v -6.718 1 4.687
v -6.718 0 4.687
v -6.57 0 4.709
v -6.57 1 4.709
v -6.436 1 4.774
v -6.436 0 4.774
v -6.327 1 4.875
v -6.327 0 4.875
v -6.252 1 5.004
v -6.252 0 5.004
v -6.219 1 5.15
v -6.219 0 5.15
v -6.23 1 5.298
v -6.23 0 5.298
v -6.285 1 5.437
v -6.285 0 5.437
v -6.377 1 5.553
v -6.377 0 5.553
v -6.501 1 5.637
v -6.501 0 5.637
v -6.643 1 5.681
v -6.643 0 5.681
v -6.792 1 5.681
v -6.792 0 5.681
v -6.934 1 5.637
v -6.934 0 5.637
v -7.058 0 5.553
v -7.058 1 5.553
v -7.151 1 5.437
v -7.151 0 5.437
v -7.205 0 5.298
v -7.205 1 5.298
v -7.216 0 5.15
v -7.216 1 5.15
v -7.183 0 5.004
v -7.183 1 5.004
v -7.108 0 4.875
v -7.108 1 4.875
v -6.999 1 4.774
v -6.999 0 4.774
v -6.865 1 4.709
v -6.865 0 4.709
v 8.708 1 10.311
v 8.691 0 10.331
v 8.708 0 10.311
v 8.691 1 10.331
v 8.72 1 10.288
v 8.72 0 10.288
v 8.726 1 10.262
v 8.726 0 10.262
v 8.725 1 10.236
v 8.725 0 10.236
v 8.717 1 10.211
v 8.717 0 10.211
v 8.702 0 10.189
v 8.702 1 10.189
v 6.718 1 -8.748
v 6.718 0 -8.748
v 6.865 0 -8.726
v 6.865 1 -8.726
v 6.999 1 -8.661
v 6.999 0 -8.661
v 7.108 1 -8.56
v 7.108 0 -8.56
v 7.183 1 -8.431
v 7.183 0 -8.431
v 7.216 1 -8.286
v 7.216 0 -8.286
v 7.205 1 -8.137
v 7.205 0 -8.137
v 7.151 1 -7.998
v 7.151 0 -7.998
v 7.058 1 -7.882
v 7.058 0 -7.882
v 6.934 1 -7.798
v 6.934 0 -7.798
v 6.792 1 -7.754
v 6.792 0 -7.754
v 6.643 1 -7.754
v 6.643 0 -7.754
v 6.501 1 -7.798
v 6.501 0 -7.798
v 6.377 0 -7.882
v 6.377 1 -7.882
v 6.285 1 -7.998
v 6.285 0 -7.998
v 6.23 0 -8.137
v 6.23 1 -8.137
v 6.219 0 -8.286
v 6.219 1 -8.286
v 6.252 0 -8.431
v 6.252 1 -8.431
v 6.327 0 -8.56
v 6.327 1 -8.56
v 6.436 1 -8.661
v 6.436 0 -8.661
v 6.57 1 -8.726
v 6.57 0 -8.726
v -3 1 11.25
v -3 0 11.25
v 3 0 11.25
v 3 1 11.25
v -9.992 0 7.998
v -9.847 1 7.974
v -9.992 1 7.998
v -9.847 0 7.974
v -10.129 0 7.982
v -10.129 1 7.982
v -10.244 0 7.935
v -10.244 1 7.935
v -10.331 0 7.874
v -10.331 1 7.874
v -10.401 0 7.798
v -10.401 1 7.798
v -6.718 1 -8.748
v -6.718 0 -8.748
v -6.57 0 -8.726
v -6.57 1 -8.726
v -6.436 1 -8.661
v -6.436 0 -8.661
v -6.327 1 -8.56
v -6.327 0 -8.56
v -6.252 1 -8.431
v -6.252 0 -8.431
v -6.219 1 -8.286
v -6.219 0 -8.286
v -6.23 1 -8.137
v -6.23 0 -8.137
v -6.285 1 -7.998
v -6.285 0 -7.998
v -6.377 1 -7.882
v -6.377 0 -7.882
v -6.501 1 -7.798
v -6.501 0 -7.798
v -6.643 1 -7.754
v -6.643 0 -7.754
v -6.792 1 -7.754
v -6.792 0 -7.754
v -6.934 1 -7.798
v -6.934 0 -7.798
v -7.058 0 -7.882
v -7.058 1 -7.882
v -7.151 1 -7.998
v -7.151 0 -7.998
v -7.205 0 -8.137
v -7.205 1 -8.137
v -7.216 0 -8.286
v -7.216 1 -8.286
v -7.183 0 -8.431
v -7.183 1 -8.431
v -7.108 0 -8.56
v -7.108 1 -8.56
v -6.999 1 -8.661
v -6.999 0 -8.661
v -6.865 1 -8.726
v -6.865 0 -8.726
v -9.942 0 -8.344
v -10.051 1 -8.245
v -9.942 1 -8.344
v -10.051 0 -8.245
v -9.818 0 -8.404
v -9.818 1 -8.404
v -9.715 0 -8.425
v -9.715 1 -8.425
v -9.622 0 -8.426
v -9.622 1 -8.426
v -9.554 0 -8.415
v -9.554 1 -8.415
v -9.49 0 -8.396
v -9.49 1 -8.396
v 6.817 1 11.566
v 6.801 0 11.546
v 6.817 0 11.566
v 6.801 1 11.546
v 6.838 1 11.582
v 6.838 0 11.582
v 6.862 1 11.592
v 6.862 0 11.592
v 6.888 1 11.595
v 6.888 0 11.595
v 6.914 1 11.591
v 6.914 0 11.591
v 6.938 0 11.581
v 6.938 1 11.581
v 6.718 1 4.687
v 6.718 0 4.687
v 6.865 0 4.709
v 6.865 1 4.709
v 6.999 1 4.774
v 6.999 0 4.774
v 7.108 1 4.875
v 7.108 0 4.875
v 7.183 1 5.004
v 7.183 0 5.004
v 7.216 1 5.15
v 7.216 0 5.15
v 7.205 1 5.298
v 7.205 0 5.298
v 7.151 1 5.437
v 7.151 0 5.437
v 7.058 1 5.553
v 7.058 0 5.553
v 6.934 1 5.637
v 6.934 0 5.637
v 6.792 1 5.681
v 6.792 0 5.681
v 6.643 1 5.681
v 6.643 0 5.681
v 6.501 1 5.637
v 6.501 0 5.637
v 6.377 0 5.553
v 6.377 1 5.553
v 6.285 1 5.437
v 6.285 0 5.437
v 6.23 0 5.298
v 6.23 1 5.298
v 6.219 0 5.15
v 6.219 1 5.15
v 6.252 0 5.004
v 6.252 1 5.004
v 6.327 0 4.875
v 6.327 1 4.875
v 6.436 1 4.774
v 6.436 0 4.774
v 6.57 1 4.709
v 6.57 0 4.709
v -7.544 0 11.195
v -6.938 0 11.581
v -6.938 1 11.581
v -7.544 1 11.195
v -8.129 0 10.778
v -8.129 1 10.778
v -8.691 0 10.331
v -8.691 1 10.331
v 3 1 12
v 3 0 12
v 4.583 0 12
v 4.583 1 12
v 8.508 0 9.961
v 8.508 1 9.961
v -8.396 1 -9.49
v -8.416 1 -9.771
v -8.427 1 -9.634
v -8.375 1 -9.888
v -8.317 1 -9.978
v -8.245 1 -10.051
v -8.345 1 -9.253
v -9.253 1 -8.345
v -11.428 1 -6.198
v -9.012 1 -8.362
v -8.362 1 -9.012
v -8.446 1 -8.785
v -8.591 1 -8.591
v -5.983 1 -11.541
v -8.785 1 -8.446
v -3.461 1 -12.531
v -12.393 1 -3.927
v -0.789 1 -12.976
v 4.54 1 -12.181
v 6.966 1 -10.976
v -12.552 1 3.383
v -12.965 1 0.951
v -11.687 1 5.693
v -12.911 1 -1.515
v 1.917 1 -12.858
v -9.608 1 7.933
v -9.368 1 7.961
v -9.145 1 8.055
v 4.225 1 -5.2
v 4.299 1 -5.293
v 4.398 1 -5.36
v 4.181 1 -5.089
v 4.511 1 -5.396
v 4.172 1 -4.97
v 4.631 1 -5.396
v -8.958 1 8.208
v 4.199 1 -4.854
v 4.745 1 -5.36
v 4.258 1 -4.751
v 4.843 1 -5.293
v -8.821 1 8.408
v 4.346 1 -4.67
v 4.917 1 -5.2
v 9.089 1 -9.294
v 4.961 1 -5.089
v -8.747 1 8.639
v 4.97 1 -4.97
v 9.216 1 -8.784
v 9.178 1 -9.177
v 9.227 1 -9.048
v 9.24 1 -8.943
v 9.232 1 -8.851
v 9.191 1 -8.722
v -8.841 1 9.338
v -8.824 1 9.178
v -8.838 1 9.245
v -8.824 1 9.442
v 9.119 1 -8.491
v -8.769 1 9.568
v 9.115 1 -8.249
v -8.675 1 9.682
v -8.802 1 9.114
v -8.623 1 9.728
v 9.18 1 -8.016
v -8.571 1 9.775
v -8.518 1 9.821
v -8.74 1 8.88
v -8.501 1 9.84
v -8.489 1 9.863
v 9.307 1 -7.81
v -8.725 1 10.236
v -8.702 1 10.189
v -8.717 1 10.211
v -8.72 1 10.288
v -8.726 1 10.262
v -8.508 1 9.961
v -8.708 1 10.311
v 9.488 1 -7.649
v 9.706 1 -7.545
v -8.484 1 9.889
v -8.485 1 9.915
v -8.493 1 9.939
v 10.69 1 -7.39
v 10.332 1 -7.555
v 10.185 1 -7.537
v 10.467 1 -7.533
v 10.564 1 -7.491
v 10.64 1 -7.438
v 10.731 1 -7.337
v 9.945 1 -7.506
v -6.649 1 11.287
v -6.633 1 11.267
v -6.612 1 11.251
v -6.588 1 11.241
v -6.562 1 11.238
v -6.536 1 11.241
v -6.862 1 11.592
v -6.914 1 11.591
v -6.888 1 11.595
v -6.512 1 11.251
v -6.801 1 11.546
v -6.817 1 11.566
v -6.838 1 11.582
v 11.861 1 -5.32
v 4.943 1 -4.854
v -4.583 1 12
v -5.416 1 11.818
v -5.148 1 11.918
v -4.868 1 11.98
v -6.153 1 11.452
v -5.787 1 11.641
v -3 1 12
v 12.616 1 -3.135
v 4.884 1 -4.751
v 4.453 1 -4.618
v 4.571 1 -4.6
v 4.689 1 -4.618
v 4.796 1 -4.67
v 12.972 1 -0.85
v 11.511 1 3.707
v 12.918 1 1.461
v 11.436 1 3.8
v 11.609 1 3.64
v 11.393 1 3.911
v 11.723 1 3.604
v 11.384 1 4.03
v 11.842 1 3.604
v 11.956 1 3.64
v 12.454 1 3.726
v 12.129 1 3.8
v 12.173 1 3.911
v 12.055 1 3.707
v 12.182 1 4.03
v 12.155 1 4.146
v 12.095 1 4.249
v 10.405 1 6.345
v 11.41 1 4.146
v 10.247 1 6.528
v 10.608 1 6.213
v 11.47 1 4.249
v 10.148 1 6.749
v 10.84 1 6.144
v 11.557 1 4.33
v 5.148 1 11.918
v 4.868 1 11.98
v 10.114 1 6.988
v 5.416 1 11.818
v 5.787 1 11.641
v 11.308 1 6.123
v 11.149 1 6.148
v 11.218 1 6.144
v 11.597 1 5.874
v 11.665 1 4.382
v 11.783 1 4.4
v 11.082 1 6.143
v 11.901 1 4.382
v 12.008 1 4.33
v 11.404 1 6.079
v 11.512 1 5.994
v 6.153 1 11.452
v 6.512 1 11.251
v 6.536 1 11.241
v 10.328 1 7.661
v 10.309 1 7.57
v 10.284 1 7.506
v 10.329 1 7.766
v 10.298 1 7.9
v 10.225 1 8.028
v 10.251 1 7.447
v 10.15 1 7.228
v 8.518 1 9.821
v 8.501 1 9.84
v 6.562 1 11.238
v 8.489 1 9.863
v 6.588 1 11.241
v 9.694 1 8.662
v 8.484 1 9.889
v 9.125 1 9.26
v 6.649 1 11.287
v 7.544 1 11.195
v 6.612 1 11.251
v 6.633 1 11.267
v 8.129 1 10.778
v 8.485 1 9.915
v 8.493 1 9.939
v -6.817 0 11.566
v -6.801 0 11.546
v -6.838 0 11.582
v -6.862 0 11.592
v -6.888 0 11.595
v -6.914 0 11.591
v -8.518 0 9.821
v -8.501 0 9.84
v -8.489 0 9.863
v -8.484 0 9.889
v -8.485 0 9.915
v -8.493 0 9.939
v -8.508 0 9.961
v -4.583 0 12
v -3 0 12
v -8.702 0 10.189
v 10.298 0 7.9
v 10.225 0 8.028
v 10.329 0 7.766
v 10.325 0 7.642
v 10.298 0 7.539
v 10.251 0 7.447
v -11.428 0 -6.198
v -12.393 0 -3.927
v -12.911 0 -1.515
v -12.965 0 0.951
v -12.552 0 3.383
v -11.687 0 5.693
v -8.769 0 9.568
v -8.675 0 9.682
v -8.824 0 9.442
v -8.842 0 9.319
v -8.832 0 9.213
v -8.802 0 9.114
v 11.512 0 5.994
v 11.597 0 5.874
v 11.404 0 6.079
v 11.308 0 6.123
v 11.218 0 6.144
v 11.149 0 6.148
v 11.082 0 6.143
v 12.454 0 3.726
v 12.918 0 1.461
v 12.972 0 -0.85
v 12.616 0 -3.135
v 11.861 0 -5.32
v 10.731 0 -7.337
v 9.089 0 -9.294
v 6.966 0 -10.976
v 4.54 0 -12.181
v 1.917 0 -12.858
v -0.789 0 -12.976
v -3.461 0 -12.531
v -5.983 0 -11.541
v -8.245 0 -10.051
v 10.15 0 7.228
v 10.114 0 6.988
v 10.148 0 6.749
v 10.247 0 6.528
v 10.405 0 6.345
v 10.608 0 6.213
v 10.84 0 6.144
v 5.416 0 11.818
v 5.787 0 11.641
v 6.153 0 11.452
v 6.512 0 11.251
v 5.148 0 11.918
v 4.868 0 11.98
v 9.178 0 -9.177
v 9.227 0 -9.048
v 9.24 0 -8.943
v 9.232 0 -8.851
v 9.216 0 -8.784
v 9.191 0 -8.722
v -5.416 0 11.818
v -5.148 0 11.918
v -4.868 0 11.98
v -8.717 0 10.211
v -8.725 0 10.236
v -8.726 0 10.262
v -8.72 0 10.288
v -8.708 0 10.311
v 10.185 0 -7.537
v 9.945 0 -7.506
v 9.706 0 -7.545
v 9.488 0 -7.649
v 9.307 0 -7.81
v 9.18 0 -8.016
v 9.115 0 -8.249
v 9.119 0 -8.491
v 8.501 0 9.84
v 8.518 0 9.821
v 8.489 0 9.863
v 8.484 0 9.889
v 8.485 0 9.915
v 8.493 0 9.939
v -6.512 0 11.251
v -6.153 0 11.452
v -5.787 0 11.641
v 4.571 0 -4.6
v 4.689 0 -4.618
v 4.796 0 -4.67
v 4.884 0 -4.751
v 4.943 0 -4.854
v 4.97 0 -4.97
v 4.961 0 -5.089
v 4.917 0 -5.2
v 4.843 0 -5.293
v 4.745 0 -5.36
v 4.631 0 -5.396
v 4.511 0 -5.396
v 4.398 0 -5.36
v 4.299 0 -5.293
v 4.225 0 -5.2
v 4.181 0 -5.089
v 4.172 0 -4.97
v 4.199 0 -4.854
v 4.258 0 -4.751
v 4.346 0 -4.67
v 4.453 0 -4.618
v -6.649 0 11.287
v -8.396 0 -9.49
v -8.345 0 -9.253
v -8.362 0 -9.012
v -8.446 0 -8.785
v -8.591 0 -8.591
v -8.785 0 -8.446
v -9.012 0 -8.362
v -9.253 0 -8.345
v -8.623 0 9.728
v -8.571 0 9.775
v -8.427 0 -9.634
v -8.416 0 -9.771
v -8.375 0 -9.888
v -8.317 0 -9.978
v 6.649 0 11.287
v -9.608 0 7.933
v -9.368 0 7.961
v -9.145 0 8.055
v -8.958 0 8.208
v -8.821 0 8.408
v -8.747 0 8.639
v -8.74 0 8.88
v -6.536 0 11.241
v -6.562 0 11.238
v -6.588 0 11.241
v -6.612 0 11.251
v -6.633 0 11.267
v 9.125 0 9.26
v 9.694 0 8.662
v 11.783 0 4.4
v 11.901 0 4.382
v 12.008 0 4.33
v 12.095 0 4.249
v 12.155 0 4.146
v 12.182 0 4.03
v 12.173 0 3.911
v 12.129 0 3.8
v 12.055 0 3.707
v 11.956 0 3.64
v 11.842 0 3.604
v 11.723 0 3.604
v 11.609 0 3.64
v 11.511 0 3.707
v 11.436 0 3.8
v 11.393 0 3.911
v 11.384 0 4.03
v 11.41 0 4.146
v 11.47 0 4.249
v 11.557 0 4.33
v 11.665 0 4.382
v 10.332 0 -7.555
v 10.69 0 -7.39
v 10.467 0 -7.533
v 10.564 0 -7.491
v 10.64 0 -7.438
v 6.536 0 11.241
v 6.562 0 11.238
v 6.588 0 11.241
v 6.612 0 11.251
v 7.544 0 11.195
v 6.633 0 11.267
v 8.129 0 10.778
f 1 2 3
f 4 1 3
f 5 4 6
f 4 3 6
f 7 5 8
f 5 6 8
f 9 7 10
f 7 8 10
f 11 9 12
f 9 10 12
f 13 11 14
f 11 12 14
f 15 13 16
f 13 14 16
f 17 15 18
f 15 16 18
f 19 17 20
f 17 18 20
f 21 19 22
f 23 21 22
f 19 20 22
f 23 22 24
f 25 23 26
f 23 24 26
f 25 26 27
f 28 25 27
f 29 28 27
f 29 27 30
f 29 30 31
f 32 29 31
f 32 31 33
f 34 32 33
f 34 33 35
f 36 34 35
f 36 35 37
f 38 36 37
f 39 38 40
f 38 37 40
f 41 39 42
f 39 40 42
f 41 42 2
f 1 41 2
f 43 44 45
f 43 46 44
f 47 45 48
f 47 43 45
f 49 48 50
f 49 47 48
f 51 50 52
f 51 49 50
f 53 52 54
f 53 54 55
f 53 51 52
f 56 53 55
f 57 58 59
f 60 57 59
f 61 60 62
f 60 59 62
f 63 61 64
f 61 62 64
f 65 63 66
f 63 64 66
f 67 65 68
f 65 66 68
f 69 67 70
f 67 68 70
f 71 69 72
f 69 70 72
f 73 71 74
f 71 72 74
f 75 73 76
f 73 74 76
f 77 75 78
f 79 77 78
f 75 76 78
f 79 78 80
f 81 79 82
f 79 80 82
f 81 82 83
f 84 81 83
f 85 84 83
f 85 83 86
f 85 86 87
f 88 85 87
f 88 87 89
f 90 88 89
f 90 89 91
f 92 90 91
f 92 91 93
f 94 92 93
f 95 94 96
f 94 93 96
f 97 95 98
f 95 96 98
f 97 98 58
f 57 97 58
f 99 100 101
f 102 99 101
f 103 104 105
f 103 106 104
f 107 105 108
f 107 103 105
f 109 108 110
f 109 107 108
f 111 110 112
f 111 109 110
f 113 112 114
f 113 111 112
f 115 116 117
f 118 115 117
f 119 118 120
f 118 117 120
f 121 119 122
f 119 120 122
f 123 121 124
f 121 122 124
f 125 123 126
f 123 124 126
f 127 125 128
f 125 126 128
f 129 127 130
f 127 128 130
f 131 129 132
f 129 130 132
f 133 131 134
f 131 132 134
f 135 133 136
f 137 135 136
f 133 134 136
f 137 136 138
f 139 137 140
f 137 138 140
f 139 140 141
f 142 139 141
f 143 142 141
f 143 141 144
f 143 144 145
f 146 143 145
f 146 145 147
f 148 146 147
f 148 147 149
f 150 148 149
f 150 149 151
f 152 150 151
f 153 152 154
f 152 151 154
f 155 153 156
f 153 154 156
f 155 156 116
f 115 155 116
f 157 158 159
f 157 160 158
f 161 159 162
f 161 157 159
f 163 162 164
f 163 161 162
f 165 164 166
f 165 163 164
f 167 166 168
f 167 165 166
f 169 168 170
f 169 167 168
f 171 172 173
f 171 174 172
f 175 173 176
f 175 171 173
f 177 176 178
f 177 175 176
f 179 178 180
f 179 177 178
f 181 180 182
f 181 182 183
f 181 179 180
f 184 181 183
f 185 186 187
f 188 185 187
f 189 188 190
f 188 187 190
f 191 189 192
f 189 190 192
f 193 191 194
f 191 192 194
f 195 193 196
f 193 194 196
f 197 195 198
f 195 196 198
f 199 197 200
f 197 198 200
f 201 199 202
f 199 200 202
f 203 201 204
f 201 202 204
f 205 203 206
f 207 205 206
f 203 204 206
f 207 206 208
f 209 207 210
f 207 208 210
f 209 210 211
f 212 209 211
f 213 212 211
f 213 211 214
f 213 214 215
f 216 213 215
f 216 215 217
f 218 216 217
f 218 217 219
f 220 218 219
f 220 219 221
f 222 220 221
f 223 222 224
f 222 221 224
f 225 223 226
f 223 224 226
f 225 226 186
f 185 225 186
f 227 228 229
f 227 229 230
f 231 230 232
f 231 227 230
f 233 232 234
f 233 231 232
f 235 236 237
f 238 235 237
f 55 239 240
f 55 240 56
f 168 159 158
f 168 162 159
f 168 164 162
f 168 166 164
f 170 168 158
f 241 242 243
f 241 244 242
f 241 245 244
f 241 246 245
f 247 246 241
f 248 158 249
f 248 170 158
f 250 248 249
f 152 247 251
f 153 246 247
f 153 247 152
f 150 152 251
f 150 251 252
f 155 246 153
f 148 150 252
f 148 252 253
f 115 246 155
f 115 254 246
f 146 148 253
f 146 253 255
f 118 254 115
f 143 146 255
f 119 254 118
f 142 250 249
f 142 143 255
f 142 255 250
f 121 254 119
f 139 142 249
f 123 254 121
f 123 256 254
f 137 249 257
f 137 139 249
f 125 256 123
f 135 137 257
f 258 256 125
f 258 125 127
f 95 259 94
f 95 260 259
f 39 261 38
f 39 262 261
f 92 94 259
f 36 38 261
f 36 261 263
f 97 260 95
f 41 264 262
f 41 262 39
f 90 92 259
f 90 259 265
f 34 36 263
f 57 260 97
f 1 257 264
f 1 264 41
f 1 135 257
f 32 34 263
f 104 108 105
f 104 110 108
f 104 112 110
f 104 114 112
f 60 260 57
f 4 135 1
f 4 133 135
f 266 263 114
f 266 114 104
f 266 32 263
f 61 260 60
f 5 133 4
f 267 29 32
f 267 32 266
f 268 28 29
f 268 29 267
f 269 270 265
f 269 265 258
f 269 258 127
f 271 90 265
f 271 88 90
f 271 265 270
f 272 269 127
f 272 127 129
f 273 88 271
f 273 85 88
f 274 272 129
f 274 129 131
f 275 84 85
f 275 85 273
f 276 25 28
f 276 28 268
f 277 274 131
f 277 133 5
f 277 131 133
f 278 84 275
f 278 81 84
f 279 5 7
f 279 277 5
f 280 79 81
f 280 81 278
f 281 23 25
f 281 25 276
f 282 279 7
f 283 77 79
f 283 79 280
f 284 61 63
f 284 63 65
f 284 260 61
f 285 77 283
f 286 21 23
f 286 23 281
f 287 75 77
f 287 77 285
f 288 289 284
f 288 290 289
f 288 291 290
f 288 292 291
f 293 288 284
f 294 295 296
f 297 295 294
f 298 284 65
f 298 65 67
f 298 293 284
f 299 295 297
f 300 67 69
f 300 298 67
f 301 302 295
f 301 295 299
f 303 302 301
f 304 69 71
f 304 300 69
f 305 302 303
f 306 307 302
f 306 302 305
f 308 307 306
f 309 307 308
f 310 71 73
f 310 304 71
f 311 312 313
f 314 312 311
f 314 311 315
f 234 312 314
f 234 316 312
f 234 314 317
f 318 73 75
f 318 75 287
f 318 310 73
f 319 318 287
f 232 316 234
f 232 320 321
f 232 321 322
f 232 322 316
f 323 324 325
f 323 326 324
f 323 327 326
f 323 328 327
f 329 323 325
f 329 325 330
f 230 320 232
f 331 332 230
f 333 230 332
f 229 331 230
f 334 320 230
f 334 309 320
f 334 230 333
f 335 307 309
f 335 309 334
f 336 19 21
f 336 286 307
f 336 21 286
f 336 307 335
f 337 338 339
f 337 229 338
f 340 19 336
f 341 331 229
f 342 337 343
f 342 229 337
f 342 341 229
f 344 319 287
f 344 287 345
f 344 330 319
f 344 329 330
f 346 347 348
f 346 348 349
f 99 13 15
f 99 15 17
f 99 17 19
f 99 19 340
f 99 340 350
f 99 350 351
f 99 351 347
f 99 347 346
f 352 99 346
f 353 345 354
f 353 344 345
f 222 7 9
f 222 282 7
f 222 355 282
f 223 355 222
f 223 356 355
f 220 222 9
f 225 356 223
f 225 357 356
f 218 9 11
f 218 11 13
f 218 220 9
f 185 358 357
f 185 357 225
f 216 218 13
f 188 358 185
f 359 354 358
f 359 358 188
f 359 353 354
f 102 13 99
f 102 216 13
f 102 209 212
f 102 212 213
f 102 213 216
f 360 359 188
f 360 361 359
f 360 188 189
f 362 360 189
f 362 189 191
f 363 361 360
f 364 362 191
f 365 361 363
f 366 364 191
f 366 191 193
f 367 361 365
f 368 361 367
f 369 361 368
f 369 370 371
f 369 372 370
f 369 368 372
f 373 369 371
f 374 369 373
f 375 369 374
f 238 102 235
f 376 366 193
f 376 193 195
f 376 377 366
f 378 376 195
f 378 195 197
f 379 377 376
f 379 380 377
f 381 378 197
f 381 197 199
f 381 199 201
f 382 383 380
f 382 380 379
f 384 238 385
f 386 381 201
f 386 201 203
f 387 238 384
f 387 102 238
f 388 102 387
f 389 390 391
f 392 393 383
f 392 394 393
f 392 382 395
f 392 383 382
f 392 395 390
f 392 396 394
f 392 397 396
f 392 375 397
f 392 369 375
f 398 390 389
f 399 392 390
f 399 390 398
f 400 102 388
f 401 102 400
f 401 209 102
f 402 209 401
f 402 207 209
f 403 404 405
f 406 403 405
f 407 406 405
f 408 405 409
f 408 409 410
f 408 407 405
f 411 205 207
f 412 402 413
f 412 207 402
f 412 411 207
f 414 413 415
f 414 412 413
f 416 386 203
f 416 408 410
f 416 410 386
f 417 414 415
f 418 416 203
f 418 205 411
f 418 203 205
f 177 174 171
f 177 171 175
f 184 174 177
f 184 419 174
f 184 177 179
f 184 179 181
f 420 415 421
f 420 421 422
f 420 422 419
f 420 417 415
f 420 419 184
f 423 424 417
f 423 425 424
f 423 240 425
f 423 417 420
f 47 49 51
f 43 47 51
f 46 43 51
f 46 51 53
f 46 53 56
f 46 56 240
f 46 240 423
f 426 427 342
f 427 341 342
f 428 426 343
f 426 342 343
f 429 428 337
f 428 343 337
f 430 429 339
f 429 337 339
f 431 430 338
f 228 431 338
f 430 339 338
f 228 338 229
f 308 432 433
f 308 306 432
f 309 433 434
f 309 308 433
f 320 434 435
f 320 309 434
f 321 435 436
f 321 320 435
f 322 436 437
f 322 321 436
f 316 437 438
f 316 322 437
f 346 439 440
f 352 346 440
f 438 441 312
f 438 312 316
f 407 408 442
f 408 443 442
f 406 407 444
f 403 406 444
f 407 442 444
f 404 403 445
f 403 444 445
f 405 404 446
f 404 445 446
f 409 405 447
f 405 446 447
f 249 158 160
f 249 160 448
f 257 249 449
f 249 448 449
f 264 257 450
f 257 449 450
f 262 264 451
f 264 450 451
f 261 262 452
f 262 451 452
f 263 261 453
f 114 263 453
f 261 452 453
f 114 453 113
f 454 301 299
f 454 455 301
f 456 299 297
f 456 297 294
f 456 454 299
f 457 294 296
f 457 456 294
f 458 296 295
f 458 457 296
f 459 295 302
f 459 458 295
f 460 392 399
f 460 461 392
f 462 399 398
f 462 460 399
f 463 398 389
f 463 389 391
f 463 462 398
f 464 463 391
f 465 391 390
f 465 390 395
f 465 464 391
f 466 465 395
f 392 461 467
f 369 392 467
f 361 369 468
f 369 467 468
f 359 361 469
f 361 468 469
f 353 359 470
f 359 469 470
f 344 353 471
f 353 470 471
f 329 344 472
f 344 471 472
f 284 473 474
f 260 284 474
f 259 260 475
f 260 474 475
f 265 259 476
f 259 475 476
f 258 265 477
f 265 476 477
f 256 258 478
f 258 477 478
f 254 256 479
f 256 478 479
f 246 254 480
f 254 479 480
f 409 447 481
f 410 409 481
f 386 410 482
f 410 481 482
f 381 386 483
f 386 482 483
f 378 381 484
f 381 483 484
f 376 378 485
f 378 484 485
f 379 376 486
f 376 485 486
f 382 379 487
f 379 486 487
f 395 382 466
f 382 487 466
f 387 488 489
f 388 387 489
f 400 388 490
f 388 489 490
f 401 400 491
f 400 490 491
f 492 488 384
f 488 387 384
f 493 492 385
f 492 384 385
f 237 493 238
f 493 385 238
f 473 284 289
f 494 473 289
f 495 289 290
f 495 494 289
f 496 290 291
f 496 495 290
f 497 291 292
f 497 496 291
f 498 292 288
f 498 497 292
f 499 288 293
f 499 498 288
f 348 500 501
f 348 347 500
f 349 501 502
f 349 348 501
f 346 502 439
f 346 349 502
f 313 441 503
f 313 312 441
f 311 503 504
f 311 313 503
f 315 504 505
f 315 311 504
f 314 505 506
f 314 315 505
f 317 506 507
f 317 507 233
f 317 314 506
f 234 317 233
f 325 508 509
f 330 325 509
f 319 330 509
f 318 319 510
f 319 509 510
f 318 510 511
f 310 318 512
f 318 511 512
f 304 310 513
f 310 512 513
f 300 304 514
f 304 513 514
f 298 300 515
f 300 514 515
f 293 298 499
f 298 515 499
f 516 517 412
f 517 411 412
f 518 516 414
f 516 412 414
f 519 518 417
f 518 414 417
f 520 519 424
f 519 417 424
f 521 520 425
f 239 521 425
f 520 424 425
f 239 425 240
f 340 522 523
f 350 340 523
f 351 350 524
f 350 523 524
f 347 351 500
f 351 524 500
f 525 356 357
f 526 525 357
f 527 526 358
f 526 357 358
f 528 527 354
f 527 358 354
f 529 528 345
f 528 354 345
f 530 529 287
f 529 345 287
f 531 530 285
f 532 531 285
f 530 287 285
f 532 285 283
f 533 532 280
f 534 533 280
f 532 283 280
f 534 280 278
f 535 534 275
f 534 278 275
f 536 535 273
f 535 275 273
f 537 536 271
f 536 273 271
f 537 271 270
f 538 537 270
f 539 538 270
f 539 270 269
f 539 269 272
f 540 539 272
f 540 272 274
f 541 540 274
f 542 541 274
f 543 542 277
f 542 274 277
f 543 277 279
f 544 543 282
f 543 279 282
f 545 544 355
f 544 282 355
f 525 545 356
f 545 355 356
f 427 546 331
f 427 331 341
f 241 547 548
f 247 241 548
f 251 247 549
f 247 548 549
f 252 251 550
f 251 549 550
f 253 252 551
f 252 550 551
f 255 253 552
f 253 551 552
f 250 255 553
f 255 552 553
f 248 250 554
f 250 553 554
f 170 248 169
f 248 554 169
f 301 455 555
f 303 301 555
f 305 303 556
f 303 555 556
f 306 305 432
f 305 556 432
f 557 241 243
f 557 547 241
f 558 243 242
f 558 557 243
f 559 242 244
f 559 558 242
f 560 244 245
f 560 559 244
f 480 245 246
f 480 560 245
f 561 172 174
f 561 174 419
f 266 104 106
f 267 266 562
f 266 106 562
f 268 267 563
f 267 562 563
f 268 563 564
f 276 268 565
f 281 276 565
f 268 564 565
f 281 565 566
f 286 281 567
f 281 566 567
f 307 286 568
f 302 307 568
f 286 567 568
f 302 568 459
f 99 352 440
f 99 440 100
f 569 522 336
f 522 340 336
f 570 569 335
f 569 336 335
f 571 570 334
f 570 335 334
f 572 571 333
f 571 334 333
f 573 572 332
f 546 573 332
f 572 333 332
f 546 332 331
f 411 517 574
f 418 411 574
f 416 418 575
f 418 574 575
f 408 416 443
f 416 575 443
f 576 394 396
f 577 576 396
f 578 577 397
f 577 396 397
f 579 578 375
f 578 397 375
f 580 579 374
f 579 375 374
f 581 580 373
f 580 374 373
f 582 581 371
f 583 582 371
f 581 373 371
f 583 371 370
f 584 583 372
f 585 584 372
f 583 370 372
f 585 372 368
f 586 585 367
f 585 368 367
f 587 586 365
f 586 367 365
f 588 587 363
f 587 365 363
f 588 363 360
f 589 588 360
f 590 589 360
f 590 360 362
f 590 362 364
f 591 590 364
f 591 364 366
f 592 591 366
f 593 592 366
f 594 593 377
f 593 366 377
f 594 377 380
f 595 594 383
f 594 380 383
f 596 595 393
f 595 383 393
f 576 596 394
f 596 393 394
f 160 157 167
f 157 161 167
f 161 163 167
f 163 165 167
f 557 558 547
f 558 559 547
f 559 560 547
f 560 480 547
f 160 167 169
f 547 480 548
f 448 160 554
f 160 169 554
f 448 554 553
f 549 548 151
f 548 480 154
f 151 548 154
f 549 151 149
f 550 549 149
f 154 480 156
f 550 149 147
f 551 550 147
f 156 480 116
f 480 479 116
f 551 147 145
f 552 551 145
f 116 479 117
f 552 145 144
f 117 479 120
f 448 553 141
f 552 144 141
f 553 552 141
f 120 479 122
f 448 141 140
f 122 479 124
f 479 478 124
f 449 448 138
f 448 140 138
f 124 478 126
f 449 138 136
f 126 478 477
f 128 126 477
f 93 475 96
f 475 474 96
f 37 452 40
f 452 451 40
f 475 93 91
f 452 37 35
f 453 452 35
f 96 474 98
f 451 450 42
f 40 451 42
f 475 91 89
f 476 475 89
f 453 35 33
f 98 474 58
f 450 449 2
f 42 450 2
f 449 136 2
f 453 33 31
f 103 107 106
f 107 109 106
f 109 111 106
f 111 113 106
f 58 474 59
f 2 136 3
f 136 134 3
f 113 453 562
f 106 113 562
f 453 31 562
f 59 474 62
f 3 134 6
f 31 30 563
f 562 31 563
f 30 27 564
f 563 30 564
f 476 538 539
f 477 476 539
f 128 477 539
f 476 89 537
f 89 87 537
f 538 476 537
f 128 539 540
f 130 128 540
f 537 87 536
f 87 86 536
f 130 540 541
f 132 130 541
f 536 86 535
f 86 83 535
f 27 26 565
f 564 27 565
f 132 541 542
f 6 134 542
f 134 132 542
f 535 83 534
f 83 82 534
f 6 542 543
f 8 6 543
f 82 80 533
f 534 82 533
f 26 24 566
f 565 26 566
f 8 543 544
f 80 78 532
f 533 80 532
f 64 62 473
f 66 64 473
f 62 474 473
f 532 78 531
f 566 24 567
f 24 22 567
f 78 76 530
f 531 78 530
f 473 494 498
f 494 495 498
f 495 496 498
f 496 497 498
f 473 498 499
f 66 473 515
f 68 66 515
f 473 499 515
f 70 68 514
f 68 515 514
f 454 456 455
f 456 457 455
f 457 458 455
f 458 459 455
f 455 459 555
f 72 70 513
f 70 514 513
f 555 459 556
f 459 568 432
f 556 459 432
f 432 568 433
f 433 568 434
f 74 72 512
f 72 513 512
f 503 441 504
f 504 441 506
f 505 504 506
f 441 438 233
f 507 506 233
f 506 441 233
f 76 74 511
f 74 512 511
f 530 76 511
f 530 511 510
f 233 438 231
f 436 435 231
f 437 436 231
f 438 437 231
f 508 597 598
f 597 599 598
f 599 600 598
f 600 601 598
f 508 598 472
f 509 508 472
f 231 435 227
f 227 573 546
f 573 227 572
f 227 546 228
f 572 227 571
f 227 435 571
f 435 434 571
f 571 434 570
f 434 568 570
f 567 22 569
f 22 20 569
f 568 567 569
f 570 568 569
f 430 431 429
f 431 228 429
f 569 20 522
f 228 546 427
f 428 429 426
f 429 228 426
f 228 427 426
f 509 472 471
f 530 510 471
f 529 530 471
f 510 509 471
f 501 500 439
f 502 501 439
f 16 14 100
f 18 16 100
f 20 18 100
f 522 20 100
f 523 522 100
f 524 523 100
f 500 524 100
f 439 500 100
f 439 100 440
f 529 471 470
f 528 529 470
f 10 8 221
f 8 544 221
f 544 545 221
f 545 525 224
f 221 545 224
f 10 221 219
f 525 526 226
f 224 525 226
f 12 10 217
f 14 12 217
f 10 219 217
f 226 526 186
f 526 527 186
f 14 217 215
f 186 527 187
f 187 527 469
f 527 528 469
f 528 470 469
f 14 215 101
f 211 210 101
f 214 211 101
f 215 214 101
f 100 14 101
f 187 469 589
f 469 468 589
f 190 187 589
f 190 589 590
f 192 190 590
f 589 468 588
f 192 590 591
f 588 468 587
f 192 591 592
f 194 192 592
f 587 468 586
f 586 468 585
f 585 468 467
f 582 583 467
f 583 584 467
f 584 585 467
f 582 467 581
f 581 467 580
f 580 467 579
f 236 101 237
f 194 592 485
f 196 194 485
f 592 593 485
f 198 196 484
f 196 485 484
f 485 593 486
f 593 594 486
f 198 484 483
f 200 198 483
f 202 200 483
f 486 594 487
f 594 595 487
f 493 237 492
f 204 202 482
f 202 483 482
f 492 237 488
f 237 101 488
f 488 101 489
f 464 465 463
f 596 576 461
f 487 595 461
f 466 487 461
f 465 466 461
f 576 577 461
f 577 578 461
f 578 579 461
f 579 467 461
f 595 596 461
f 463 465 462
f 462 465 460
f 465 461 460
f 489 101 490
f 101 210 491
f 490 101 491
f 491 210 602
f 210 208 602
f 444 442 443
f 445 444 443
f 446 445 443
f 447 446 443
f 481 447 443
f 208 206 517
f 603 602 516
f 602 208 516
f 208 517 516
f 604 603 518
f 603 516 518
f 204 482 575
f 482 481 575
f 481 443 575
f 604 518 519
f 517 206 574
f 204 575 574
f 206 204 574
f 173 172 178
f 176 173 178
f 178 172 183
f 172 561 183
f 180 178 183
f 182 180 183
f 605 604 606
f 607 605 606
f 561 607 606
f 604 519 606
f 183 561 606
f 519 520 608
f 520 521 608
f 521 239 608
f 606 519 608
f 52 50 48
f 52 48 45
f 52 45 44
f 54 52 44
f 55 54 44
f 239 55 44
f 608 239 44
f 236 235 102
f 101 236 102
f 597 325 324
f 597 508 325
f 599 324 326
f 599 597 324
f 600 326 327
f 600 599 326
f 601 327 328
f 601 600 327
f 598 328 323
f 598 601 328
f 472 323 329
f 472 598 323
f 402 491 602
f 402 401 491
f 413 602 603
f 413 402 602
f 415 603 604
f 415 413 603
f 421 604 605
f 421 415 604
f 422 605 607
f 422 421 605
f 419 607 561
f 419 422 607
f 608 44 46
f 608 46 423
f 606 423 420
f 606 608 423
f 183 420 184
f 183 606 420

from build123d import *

# Parameters (mm, degrees)
SKETCH1_R               = 13
BOSS_EXTRUDE1_DEPTH     = 1
CUT_EXTRUDE2_DEPTH      = 1
FILLET1_R               = 2
SKETCH4_R               = 0.5
CUT_EXTRUDE3_DEPTH      = 1
SKETCH6_R               = 0.85
CUT_EXTRUDE4_DEPTH      = 10
FILLET2_R               = 0.5
BOSS_EXTRUDE4_START     = -1
BOSS_EXTRUDE4_DEPTH     = 1
FILLET4_R               = 0.1
CUT_EXTRUDE6_DEPTH      = 19.411952786
CUT_EXTRUDE6_DEPTH_BACK = 19.411952786
SKETCH11_W              = 6
SKETCH11_H              = 1.5
SKETCH12_R              = 0.4
CUT_EXTRUDE7_DEPTH      = 1


with BuildPart() as part:
    # Sketch1 → Boss-Extrude1 (new body)
    with BuildSketch(Plane(origin=(0, 0, 0), x_dir=(1, 0, 0), z_dir=(0, 1, 0))):
        with Locations(Location((0, 0, 0), (0, 0, 270))):
            Circle(SKETCH1_R)
    extrude(amount=BOSS_EXTRUDE1_DEPTH)

    # Sketch3 → Cut-Extrude2 (cut)
    with BuildSketch(Plane(origin=(0, 0, 0), x_dir=(1, 0, 0), z_dir=(0, 1, 0))):
        with BuildLine():
            Line((-5, -12), (5, -12))
            ThreePointArc((5, -12), (0, -13), (-5, -12))
        make_face()
    extrude(amount=CUT_EXTRUDE2_DEPTH, mode=Mode.SUBTRACT)

    # Fillet1
    fillet1_edges = [part.edges().sort_by_distance(p)[0] for p in [
        (-5, 0.5, 12),
        (5, 0.5, 12),
    ]]
    fillet(fillet1_edges, radius=FILLET1_R)

    # Sketch4 → Cut-Extrude3 (cut)
    with BuildSketch(Plane.XZ):
        with Locations(Location((6.717514421, 5.186869411, 0), (0, 0, 270))):
            Circle(SKETCH4_R)
        with Locations(Location((-6.717514421, 5.186869411, 0), (0, 0, 270))):
            Circle(SKETCH4_R)
        with Locations(Location((-6.717514421, -8.248159431, 0), (0, 0, 270))):
            Circle(SKETCH4_R)
        with Locations(Location((6.717514421, -8.248159431, 0), (0, 0, 270))):
            Circle(SKETCH4_R)
    extrude(amount=-CUT_EXTRUDE3_DEPTH, mode=Mode.SUBTRACT)

    # Sketch6 → Cut-Extrude4 (cut)
    with BuildSketch(Plane.XZ):
        with Locations((9.958577761, -8.356238926)):
            Circle(SKETCH6_R)
        with Locations((-9.584605379, 8.782672699)):
            Circle(SKETCH6_R)
        with Locations((-9.192388155, -9.192388155)):
            Circle(SKETCH6_R)
        with Locations((10.964088796, 6.984894909)):
            Circle(SKETCH6_R)
    extrude(amount=-CUT_EXTRUDE4_DEPTH, mode=Mode.SUBTRACT)

    # Fillet2
    fillet2_edges = [part.edges().sort_by_distance(p)[0] for p in [
        (10.484191703, 0.5, 7.686463708),
        (11.397112787, 0.5, 6.25346465),
        (-10.138062294, 0.5, 8.137548337),
        (-8.990172858, 0.5, 9.390249836),
        (-8.57201926, 0.5, -9.773458232),
        (-9.773458232, 0.5, -8.57201926),
        (10.483367978, 0.5, -7.687587127),
        (9.39121315, 0.5, -8.989166567),
    ]]
    fillet(fillet2_edges, radius=FILLET2_R)

    # Sketch10 → Boss-Extrude4 (add)
    with BuildSketch(Plane(origin=(0, 1, 0), x_dir=(1, 0, 0), z_dir=(0, 1, 0)).offset(BOSS_EXTRUDE4_START)):
        with BuildLine():
            Line((-6.597998718, -11.201179086), (-6.8517679, -11.631993666))
            ThreePointArc((-6.8517679, -11.631993666), (-7.839489902, -10.990559498), (-8.767548652, -10.265480536))
            Line((-8.767548652, -10.265480536), (-8.442824628, -9.885277553))
            ThreePointArc((-8.442824628, -9.885277553), (-7.549138424, -10.583501739), (-6.597998718, -11.201179086))
        make_face()
        with BuildLine():
            Line((8.442824628, -9.885277553), (8.767548652, -10.265480536))
            ThreePointArc((8.767548652, -10.265480536), (7.839489902, -10.990559498), (6.8517679, -11.631993666))
            Line((6.8517679, -11.631993666), (6.597998718, -11.201179086))
            ThreePointArc((6.597998718, -11.201179086), (7.549138424, -10.583501739), (8.442824628, -9.885277553))
        make_face()
    extrude(amount=BOSS_EXTRUDE4_DEPTH)

    # Fillet4
    fillet4_edges = [part.edges().sort_by_distance(p)[0] for p in [
        (-8.442824628, 0.5, 9.885277553),
        (-6.597998718, 0.5, 11.201179086),
        (-6.8517679, 0.5, 11.631993666),
        (-8.767548652, 0.5, 10.265480536),
        (6.597998718, 0.5, 11.201179086),
        (8.442824628, 0.5, 9.885277553),
        (8.767548652, 0.5, 10.265480536),
        (6.8517679, 0.5, 11.631993666),
    ]]
    fillet(fillet4_edges, radius=FILLET4_R)

    # Sketch11 → Cut-Extrude6 (cut, two sides: drawn at the far end of the back side and taken through both)
    with BuildSketch(Plane(origin=(0, 0, 0), x_dir=(1, 0, 0), z_dir=(0, 1, 0)).offset(-CUT_EXTRUDE6_DEPTH_BACK)):
        with Locations((0, -12)):
            Rectangle(SKETCH11_W, SKETCH11_H)
    extrude(amount=CUT_EXTRUDE6_DEPTH + CUT_EXTRUDE6_DEPTH_BACK, mode=Mode.SUBTRACT)

    # Sketch12 → Cut-Extrude7 (cut)
    with BuildSketch(Plane(origin=(0, 1, 0), x_dir=(1, 0, 0), z_dir=(0, 1, 0))):
        with Locations(Location((4.571073678, 5, 0), (0, 0, 270))):
            Circle(SKETCH12_R)
        with Locations(Location((11.782754706, -4.000000001, 0), (0, 0, 270))):
            Circle(SKETCH12_R)
    extrude(amount=-CUT_EXTRUDE7_DEPTH, mode=Mode.SUBTRACT)


solid = part.part
